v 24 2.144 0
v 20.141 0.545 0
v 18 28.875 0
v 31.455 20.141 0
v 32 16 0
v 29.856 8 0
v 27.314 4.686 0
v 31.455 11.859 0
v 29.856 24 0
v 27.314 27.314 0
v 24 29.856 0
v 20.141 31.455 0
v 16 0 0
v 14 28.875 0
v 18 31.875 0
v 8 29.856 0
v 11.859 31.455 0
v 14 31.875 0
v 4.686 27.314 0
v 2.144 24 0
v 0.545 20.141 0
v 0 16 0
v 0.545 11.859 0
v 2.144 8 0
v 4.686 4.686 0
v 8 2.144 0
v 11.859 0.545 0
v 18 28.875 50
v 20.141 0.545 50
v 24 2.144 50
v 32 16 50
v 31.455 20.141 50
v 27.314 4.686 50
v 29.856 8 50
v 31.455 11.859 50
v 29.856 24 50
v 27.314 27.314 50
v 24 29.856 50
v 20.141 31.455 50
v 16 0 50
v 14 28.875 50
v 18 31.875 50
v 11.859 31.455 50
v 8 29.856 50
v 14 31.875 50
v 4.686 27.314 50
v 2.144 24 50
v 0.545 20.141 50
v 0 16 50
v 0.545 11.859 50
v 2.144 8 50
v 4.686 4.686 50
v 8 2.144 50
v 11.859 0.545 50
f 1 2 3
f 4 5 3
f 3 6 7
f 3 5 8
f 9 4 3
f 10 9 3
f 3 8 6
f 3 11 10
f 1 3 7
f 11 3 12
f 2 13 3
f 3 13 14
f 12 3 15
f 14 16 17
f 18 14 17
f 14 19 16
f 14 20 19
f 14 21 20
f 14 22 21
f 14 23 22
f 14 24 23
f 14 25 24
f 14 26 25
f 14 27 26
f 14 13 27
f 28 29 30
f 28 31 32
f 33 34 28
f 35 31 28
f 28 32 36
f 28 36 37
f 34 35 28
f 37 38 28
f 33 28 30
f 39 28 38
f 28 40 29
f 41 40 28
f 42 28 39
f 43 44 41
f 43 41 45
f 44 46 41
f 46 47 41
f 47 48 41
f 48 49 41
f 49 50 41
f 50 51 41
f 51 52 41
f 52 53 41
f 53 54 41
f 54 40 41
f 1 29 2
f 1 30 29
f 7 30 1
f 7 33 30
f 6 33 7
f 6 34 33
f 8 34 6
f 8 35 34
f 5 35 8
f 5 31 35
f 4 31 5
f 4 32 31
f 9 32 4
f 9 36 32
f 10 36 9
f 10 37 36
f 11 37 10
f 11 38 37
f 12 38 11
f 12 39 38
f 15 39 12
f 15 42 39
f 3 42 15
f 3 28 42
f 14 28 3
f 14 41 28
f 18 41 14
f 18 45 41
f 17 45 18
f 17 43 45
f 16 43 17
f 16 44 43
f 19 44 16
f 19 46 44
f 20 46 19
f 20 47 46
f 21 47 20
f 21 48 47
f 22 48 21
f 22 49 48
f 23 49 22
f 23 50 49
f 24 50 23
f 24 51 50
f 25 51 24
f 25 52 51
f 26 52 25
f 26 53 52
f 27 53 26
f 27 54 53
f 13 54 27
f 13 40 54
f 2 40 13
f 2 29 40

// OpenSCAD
$fn = 32;

// ----------------------------------------------------------------------
// Keyway shaft: d32 shaft, key 4 x 3 mm
// ----------------------------------------------------------------------

// --- parameters (mm) ---
shaft_r = 16;             // shaft radius
key_w = 4;                // keyway width
key_d = 3;                // keyway depth below the surface line
plate_t = 50;             // shaft length, Z (extrusion height)

shaft_d = 2 * shaft_r;  // shaft diameter
circle_step = 15;  // polygon sampling step, degrees

profile = [[11.859, 31.455], [8, 29.856], [4.686, 27.314], [2.144, 24], [0.545, 20.141], [0, 16], [0.545, 11.859], [2.144, 8], [4.686, 4.686], [8, 2.144], [11.859, 0.545], [16, 0], [20.141, 0.545], [24, 2.144], [27.314, 4.686], [29.856, 8], [31.455, 11.859], [32, 16], [31.455, 20.141], [29.856, 24], [27.314, 27.314], [24, 29.856], [20.141, 31.455], [18, 31.875], [18, 28.875], [14, 28.875], [14, 31.875]];  // primary outline, 27 points, counter clockwise

// --- the one profile operation ---
linear_extrude(height = plate_t) polygon(points = profile);
